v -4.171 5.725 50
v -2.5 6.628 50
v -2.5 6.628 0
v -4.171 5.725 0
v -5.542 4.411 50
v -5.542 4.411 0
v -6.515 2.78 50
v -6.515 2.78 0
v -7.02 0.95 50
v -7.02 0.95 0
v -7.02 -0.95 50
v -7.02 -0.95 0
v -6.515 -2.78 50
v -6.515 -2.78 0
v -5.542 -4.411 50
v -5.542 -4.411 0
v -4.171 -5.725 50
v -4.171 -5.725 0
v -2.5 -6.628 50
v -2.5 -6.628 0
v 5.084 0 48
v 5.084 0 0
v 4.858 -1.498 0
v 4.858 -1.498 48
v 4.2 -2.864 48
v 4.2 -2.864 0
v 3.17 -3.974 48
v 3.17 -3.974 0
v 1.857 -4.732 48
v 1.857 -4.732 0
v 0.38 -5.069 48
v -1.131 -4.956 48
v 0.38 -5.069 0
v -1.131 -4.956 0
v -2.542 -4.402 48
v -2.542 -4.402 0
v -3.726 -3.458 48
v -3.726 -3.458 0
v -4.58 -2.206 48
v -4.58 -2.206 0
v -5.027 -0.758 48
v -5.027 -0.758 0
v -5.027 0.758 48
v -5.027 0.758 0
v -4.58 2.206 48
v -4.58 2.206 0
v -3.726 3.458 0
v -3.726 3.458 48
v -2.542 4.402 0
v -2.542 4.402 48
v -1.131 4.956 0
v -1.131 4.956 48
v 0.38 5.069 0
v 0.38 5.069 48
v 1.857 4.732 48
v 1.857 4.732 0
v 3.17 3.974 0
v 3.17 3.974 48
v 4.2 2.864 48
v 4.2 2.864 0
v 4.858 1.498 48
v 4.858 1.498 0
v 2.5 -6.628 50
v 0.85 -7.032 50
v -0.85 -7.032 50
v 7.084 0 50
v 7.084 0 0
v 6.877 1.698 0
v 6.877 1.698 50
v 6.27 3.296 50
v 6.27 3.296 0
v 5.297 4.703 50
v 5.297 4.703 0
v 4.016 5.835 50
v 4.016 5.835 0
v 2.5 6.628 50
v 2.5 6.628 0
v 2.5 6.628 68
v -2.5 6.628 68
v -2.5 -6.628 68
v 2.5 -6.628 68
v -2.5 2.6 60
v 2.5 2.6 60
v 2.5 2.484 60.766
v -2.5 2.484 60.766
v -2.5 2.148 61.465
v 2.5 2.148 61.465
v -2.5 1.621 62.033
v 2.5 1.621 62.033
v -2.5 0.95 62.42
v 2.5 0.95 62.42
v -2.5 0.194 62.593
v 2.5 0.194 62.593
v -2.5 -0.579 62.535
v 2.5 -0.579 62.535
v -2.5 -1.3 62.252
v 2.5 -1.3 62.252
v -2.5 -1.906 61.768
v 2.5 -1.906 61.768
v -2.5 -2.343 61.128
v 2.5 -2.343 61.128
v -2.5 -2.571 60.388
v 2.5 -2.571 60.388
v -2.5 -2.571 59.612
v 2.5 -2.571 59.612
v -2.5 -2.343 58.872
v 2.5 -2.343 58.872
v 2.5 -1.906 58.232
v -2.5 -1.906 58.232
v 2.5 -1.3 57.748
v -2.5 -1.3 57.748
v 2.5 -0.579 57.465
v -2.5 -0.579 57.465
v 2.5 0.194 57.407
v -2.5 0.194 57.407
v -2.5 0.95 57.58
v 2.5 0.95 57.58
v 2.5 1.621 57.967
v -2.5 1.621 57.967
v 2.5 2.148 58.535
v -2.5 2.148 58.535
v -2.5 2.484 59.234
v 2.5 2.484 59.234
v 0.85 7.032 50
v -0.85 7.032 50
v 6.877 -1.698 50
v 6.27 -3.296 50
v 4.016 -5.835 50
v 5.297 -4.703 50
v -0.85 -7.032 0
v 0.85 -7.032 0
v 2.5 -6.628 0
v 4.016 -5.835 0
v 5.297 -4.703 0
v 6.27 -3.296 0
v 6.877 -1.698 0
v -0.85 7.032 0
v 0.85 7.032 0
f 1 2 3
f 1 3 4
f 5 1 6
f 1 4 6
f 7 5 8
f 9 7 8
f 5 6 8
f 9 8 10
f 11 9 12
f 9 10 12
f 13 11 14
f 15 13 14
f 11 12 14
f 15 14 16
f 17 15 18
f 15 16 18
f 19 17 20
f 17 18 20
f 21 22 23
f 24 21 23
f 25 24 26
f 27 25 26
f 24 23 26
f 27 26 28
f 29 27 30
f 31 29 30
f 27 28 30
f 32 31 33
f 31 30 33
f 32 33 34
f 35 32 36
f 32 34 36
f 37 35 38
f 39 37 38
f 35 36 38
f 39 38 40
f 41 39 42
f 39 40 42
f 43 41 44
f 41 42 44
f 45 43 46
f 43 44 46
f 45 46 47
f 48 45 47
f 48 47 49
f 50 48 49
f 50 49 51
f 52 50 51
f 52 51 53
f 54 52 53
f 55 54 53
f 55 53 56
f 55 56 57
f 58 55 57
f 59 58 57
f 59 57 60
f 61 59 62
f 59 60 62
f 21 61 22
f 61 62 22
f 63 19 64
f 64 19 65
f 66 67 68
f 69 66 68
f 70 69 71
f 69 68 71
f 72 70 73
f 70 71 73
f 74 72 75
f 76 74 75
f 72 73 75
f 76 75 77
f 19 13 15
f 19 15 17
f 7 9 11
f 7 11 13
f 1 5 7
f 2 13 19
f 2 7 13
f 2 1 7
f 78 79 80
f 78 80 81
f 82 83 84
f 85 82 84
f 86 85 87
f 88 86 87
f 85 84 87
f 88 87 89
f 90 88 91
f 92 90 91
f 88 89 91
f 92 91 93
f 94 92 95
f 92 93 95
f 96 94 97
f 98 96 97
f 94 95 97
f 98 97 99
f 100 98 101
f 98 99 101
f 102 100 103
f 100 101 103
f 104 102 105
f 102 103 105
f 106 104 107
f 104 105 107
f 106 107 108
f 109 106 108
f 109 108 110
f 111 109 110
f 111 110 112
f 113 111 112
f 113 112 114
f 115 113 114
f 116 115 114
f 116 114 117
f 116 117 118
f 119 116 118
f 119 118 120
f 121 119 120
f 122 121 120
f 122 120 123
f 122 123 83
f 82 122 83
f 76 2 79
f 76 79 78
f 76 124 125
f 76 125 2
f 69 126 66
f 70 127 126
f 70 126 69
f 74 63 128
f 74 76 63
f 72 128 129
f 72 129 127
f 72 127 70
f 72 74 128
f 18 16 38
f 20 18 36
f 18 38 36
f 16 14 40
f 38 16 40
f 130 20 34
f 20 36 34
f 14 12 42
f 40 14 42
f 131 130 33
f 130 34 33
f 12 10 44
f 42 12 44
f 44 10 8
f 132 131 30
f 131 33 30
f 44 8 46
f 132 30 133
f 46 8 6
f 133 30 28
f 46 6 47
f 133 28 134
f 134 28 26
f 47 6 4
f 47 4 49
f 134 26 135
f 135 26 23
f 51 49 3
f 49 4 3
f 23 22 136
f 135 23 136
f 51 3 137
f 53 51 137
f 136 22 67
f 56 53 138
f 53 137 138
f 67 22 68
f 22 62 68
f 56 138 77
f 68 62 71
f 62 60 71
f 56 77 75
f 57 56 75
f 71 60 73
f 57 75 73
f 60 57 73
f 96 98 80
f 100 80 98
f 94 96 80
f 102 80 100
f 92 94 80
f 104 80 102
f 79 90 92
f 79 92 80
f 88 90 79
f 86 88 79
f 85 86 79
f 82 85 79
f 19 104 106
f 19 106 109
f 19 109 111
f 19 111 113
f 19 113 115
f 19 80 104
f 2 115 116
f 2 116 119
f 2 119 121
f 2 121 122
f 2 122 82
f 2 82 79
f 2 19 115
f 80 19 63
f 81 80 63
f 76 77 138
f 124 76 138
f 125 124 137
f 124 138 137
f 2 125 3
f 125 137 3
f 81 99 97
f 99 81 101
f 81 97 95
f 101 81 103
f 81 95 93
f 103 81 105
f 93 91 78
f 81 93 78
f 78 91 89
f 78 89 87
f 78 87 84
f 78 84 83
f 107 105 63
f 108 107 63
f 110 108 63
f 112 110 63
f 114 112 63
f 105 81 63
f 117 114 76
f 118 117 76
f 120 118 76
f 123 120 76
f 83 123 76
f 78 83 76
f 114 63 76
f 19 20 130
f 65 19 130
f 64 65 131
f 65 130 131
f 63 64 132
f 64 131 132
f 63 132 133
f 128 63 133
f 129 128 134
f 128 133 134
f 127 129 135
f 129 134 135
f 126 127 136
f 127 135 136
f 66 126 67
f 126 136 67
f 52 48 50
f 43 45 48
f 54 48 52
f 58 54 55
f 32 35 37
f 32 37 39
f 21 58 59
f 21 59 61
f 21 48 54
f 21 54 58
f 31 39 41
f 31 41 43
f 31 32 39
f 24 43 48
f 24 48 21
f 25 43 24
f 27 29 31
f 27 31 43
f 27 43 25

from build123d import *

# Parameters (mm, degrees)
F1_DEPTH = 50
F0_W     = 5
F0_H     = 13.255382
F2_DEPTH = 68
F3_R     = 2.6
F4_DEPTH = 9.584522
F5_R     = 5.083522
F6_DEPTH = 48


with BuildPart() as f1:
    # F0 (on Top) → F1 (new body)
    with BuildSketch(Plane.XY):
        with BuildLine():
            ThreePointArc((2.5, -6.627691), (5.826023, -4.029111), (7.083522, 0))
            ThreePointArc((7.083522, 0), (5.826023, 4.029111), (2.5, 6.627691))
            Line((2.5, 6.627691), (2.5, -6.627691))
        make_face()
        with BuildLine():
            Line((-2.5, 6.627691), (2.5, 6.627691))
            ThreePointArc((2.5, 6.627691), (0, 7.083522), (-2.5, 6.627691))
        make_face()
        with BuildLine():
            ThreePointArc((-2.5, -6.627691), (0, -7.083522), (2.5, -6.627691))
            Line((2.5, -6.627691), (-2.5, -6.627691))
        make_face()
        with BuildLine():
            Line((-2.5, -6.627691), (-2.5, 6.627691))
            ThreePointArc((-2.5, 6.627691), (-7.083522, 0), (-2.5, -6.627691))
        make_face()
    extrude(amount=F1_DEPTH)

    # F0 (on Top) → F2 (join)
    with BuildSketch(Plane.XY):
        Rectangle(F0_W, F0_H)
    extrude(amount=F2_DEPTH)

    # F3 (on face) → F4 (cut, through all)
    with BuildSketch(Plane.YZ.offset(2.5)):
        with Locations((0, 60)):
            Circle(F3_R)
    extrude(amount=-F4_DEPTH, mode=Mode.SUBTRACT)

    # F5 (on face) → F6 (cut)
    with BuildSketch(Plane(origin=(0, 0, 0), x_dir=(1, 0, 0), z_dir=(0, 0, -1))):
        Circle(F5_R)
    extrude(amount=-F6_DEPTH, mode=Mode.SUBTRACT)


solid = f1.part
